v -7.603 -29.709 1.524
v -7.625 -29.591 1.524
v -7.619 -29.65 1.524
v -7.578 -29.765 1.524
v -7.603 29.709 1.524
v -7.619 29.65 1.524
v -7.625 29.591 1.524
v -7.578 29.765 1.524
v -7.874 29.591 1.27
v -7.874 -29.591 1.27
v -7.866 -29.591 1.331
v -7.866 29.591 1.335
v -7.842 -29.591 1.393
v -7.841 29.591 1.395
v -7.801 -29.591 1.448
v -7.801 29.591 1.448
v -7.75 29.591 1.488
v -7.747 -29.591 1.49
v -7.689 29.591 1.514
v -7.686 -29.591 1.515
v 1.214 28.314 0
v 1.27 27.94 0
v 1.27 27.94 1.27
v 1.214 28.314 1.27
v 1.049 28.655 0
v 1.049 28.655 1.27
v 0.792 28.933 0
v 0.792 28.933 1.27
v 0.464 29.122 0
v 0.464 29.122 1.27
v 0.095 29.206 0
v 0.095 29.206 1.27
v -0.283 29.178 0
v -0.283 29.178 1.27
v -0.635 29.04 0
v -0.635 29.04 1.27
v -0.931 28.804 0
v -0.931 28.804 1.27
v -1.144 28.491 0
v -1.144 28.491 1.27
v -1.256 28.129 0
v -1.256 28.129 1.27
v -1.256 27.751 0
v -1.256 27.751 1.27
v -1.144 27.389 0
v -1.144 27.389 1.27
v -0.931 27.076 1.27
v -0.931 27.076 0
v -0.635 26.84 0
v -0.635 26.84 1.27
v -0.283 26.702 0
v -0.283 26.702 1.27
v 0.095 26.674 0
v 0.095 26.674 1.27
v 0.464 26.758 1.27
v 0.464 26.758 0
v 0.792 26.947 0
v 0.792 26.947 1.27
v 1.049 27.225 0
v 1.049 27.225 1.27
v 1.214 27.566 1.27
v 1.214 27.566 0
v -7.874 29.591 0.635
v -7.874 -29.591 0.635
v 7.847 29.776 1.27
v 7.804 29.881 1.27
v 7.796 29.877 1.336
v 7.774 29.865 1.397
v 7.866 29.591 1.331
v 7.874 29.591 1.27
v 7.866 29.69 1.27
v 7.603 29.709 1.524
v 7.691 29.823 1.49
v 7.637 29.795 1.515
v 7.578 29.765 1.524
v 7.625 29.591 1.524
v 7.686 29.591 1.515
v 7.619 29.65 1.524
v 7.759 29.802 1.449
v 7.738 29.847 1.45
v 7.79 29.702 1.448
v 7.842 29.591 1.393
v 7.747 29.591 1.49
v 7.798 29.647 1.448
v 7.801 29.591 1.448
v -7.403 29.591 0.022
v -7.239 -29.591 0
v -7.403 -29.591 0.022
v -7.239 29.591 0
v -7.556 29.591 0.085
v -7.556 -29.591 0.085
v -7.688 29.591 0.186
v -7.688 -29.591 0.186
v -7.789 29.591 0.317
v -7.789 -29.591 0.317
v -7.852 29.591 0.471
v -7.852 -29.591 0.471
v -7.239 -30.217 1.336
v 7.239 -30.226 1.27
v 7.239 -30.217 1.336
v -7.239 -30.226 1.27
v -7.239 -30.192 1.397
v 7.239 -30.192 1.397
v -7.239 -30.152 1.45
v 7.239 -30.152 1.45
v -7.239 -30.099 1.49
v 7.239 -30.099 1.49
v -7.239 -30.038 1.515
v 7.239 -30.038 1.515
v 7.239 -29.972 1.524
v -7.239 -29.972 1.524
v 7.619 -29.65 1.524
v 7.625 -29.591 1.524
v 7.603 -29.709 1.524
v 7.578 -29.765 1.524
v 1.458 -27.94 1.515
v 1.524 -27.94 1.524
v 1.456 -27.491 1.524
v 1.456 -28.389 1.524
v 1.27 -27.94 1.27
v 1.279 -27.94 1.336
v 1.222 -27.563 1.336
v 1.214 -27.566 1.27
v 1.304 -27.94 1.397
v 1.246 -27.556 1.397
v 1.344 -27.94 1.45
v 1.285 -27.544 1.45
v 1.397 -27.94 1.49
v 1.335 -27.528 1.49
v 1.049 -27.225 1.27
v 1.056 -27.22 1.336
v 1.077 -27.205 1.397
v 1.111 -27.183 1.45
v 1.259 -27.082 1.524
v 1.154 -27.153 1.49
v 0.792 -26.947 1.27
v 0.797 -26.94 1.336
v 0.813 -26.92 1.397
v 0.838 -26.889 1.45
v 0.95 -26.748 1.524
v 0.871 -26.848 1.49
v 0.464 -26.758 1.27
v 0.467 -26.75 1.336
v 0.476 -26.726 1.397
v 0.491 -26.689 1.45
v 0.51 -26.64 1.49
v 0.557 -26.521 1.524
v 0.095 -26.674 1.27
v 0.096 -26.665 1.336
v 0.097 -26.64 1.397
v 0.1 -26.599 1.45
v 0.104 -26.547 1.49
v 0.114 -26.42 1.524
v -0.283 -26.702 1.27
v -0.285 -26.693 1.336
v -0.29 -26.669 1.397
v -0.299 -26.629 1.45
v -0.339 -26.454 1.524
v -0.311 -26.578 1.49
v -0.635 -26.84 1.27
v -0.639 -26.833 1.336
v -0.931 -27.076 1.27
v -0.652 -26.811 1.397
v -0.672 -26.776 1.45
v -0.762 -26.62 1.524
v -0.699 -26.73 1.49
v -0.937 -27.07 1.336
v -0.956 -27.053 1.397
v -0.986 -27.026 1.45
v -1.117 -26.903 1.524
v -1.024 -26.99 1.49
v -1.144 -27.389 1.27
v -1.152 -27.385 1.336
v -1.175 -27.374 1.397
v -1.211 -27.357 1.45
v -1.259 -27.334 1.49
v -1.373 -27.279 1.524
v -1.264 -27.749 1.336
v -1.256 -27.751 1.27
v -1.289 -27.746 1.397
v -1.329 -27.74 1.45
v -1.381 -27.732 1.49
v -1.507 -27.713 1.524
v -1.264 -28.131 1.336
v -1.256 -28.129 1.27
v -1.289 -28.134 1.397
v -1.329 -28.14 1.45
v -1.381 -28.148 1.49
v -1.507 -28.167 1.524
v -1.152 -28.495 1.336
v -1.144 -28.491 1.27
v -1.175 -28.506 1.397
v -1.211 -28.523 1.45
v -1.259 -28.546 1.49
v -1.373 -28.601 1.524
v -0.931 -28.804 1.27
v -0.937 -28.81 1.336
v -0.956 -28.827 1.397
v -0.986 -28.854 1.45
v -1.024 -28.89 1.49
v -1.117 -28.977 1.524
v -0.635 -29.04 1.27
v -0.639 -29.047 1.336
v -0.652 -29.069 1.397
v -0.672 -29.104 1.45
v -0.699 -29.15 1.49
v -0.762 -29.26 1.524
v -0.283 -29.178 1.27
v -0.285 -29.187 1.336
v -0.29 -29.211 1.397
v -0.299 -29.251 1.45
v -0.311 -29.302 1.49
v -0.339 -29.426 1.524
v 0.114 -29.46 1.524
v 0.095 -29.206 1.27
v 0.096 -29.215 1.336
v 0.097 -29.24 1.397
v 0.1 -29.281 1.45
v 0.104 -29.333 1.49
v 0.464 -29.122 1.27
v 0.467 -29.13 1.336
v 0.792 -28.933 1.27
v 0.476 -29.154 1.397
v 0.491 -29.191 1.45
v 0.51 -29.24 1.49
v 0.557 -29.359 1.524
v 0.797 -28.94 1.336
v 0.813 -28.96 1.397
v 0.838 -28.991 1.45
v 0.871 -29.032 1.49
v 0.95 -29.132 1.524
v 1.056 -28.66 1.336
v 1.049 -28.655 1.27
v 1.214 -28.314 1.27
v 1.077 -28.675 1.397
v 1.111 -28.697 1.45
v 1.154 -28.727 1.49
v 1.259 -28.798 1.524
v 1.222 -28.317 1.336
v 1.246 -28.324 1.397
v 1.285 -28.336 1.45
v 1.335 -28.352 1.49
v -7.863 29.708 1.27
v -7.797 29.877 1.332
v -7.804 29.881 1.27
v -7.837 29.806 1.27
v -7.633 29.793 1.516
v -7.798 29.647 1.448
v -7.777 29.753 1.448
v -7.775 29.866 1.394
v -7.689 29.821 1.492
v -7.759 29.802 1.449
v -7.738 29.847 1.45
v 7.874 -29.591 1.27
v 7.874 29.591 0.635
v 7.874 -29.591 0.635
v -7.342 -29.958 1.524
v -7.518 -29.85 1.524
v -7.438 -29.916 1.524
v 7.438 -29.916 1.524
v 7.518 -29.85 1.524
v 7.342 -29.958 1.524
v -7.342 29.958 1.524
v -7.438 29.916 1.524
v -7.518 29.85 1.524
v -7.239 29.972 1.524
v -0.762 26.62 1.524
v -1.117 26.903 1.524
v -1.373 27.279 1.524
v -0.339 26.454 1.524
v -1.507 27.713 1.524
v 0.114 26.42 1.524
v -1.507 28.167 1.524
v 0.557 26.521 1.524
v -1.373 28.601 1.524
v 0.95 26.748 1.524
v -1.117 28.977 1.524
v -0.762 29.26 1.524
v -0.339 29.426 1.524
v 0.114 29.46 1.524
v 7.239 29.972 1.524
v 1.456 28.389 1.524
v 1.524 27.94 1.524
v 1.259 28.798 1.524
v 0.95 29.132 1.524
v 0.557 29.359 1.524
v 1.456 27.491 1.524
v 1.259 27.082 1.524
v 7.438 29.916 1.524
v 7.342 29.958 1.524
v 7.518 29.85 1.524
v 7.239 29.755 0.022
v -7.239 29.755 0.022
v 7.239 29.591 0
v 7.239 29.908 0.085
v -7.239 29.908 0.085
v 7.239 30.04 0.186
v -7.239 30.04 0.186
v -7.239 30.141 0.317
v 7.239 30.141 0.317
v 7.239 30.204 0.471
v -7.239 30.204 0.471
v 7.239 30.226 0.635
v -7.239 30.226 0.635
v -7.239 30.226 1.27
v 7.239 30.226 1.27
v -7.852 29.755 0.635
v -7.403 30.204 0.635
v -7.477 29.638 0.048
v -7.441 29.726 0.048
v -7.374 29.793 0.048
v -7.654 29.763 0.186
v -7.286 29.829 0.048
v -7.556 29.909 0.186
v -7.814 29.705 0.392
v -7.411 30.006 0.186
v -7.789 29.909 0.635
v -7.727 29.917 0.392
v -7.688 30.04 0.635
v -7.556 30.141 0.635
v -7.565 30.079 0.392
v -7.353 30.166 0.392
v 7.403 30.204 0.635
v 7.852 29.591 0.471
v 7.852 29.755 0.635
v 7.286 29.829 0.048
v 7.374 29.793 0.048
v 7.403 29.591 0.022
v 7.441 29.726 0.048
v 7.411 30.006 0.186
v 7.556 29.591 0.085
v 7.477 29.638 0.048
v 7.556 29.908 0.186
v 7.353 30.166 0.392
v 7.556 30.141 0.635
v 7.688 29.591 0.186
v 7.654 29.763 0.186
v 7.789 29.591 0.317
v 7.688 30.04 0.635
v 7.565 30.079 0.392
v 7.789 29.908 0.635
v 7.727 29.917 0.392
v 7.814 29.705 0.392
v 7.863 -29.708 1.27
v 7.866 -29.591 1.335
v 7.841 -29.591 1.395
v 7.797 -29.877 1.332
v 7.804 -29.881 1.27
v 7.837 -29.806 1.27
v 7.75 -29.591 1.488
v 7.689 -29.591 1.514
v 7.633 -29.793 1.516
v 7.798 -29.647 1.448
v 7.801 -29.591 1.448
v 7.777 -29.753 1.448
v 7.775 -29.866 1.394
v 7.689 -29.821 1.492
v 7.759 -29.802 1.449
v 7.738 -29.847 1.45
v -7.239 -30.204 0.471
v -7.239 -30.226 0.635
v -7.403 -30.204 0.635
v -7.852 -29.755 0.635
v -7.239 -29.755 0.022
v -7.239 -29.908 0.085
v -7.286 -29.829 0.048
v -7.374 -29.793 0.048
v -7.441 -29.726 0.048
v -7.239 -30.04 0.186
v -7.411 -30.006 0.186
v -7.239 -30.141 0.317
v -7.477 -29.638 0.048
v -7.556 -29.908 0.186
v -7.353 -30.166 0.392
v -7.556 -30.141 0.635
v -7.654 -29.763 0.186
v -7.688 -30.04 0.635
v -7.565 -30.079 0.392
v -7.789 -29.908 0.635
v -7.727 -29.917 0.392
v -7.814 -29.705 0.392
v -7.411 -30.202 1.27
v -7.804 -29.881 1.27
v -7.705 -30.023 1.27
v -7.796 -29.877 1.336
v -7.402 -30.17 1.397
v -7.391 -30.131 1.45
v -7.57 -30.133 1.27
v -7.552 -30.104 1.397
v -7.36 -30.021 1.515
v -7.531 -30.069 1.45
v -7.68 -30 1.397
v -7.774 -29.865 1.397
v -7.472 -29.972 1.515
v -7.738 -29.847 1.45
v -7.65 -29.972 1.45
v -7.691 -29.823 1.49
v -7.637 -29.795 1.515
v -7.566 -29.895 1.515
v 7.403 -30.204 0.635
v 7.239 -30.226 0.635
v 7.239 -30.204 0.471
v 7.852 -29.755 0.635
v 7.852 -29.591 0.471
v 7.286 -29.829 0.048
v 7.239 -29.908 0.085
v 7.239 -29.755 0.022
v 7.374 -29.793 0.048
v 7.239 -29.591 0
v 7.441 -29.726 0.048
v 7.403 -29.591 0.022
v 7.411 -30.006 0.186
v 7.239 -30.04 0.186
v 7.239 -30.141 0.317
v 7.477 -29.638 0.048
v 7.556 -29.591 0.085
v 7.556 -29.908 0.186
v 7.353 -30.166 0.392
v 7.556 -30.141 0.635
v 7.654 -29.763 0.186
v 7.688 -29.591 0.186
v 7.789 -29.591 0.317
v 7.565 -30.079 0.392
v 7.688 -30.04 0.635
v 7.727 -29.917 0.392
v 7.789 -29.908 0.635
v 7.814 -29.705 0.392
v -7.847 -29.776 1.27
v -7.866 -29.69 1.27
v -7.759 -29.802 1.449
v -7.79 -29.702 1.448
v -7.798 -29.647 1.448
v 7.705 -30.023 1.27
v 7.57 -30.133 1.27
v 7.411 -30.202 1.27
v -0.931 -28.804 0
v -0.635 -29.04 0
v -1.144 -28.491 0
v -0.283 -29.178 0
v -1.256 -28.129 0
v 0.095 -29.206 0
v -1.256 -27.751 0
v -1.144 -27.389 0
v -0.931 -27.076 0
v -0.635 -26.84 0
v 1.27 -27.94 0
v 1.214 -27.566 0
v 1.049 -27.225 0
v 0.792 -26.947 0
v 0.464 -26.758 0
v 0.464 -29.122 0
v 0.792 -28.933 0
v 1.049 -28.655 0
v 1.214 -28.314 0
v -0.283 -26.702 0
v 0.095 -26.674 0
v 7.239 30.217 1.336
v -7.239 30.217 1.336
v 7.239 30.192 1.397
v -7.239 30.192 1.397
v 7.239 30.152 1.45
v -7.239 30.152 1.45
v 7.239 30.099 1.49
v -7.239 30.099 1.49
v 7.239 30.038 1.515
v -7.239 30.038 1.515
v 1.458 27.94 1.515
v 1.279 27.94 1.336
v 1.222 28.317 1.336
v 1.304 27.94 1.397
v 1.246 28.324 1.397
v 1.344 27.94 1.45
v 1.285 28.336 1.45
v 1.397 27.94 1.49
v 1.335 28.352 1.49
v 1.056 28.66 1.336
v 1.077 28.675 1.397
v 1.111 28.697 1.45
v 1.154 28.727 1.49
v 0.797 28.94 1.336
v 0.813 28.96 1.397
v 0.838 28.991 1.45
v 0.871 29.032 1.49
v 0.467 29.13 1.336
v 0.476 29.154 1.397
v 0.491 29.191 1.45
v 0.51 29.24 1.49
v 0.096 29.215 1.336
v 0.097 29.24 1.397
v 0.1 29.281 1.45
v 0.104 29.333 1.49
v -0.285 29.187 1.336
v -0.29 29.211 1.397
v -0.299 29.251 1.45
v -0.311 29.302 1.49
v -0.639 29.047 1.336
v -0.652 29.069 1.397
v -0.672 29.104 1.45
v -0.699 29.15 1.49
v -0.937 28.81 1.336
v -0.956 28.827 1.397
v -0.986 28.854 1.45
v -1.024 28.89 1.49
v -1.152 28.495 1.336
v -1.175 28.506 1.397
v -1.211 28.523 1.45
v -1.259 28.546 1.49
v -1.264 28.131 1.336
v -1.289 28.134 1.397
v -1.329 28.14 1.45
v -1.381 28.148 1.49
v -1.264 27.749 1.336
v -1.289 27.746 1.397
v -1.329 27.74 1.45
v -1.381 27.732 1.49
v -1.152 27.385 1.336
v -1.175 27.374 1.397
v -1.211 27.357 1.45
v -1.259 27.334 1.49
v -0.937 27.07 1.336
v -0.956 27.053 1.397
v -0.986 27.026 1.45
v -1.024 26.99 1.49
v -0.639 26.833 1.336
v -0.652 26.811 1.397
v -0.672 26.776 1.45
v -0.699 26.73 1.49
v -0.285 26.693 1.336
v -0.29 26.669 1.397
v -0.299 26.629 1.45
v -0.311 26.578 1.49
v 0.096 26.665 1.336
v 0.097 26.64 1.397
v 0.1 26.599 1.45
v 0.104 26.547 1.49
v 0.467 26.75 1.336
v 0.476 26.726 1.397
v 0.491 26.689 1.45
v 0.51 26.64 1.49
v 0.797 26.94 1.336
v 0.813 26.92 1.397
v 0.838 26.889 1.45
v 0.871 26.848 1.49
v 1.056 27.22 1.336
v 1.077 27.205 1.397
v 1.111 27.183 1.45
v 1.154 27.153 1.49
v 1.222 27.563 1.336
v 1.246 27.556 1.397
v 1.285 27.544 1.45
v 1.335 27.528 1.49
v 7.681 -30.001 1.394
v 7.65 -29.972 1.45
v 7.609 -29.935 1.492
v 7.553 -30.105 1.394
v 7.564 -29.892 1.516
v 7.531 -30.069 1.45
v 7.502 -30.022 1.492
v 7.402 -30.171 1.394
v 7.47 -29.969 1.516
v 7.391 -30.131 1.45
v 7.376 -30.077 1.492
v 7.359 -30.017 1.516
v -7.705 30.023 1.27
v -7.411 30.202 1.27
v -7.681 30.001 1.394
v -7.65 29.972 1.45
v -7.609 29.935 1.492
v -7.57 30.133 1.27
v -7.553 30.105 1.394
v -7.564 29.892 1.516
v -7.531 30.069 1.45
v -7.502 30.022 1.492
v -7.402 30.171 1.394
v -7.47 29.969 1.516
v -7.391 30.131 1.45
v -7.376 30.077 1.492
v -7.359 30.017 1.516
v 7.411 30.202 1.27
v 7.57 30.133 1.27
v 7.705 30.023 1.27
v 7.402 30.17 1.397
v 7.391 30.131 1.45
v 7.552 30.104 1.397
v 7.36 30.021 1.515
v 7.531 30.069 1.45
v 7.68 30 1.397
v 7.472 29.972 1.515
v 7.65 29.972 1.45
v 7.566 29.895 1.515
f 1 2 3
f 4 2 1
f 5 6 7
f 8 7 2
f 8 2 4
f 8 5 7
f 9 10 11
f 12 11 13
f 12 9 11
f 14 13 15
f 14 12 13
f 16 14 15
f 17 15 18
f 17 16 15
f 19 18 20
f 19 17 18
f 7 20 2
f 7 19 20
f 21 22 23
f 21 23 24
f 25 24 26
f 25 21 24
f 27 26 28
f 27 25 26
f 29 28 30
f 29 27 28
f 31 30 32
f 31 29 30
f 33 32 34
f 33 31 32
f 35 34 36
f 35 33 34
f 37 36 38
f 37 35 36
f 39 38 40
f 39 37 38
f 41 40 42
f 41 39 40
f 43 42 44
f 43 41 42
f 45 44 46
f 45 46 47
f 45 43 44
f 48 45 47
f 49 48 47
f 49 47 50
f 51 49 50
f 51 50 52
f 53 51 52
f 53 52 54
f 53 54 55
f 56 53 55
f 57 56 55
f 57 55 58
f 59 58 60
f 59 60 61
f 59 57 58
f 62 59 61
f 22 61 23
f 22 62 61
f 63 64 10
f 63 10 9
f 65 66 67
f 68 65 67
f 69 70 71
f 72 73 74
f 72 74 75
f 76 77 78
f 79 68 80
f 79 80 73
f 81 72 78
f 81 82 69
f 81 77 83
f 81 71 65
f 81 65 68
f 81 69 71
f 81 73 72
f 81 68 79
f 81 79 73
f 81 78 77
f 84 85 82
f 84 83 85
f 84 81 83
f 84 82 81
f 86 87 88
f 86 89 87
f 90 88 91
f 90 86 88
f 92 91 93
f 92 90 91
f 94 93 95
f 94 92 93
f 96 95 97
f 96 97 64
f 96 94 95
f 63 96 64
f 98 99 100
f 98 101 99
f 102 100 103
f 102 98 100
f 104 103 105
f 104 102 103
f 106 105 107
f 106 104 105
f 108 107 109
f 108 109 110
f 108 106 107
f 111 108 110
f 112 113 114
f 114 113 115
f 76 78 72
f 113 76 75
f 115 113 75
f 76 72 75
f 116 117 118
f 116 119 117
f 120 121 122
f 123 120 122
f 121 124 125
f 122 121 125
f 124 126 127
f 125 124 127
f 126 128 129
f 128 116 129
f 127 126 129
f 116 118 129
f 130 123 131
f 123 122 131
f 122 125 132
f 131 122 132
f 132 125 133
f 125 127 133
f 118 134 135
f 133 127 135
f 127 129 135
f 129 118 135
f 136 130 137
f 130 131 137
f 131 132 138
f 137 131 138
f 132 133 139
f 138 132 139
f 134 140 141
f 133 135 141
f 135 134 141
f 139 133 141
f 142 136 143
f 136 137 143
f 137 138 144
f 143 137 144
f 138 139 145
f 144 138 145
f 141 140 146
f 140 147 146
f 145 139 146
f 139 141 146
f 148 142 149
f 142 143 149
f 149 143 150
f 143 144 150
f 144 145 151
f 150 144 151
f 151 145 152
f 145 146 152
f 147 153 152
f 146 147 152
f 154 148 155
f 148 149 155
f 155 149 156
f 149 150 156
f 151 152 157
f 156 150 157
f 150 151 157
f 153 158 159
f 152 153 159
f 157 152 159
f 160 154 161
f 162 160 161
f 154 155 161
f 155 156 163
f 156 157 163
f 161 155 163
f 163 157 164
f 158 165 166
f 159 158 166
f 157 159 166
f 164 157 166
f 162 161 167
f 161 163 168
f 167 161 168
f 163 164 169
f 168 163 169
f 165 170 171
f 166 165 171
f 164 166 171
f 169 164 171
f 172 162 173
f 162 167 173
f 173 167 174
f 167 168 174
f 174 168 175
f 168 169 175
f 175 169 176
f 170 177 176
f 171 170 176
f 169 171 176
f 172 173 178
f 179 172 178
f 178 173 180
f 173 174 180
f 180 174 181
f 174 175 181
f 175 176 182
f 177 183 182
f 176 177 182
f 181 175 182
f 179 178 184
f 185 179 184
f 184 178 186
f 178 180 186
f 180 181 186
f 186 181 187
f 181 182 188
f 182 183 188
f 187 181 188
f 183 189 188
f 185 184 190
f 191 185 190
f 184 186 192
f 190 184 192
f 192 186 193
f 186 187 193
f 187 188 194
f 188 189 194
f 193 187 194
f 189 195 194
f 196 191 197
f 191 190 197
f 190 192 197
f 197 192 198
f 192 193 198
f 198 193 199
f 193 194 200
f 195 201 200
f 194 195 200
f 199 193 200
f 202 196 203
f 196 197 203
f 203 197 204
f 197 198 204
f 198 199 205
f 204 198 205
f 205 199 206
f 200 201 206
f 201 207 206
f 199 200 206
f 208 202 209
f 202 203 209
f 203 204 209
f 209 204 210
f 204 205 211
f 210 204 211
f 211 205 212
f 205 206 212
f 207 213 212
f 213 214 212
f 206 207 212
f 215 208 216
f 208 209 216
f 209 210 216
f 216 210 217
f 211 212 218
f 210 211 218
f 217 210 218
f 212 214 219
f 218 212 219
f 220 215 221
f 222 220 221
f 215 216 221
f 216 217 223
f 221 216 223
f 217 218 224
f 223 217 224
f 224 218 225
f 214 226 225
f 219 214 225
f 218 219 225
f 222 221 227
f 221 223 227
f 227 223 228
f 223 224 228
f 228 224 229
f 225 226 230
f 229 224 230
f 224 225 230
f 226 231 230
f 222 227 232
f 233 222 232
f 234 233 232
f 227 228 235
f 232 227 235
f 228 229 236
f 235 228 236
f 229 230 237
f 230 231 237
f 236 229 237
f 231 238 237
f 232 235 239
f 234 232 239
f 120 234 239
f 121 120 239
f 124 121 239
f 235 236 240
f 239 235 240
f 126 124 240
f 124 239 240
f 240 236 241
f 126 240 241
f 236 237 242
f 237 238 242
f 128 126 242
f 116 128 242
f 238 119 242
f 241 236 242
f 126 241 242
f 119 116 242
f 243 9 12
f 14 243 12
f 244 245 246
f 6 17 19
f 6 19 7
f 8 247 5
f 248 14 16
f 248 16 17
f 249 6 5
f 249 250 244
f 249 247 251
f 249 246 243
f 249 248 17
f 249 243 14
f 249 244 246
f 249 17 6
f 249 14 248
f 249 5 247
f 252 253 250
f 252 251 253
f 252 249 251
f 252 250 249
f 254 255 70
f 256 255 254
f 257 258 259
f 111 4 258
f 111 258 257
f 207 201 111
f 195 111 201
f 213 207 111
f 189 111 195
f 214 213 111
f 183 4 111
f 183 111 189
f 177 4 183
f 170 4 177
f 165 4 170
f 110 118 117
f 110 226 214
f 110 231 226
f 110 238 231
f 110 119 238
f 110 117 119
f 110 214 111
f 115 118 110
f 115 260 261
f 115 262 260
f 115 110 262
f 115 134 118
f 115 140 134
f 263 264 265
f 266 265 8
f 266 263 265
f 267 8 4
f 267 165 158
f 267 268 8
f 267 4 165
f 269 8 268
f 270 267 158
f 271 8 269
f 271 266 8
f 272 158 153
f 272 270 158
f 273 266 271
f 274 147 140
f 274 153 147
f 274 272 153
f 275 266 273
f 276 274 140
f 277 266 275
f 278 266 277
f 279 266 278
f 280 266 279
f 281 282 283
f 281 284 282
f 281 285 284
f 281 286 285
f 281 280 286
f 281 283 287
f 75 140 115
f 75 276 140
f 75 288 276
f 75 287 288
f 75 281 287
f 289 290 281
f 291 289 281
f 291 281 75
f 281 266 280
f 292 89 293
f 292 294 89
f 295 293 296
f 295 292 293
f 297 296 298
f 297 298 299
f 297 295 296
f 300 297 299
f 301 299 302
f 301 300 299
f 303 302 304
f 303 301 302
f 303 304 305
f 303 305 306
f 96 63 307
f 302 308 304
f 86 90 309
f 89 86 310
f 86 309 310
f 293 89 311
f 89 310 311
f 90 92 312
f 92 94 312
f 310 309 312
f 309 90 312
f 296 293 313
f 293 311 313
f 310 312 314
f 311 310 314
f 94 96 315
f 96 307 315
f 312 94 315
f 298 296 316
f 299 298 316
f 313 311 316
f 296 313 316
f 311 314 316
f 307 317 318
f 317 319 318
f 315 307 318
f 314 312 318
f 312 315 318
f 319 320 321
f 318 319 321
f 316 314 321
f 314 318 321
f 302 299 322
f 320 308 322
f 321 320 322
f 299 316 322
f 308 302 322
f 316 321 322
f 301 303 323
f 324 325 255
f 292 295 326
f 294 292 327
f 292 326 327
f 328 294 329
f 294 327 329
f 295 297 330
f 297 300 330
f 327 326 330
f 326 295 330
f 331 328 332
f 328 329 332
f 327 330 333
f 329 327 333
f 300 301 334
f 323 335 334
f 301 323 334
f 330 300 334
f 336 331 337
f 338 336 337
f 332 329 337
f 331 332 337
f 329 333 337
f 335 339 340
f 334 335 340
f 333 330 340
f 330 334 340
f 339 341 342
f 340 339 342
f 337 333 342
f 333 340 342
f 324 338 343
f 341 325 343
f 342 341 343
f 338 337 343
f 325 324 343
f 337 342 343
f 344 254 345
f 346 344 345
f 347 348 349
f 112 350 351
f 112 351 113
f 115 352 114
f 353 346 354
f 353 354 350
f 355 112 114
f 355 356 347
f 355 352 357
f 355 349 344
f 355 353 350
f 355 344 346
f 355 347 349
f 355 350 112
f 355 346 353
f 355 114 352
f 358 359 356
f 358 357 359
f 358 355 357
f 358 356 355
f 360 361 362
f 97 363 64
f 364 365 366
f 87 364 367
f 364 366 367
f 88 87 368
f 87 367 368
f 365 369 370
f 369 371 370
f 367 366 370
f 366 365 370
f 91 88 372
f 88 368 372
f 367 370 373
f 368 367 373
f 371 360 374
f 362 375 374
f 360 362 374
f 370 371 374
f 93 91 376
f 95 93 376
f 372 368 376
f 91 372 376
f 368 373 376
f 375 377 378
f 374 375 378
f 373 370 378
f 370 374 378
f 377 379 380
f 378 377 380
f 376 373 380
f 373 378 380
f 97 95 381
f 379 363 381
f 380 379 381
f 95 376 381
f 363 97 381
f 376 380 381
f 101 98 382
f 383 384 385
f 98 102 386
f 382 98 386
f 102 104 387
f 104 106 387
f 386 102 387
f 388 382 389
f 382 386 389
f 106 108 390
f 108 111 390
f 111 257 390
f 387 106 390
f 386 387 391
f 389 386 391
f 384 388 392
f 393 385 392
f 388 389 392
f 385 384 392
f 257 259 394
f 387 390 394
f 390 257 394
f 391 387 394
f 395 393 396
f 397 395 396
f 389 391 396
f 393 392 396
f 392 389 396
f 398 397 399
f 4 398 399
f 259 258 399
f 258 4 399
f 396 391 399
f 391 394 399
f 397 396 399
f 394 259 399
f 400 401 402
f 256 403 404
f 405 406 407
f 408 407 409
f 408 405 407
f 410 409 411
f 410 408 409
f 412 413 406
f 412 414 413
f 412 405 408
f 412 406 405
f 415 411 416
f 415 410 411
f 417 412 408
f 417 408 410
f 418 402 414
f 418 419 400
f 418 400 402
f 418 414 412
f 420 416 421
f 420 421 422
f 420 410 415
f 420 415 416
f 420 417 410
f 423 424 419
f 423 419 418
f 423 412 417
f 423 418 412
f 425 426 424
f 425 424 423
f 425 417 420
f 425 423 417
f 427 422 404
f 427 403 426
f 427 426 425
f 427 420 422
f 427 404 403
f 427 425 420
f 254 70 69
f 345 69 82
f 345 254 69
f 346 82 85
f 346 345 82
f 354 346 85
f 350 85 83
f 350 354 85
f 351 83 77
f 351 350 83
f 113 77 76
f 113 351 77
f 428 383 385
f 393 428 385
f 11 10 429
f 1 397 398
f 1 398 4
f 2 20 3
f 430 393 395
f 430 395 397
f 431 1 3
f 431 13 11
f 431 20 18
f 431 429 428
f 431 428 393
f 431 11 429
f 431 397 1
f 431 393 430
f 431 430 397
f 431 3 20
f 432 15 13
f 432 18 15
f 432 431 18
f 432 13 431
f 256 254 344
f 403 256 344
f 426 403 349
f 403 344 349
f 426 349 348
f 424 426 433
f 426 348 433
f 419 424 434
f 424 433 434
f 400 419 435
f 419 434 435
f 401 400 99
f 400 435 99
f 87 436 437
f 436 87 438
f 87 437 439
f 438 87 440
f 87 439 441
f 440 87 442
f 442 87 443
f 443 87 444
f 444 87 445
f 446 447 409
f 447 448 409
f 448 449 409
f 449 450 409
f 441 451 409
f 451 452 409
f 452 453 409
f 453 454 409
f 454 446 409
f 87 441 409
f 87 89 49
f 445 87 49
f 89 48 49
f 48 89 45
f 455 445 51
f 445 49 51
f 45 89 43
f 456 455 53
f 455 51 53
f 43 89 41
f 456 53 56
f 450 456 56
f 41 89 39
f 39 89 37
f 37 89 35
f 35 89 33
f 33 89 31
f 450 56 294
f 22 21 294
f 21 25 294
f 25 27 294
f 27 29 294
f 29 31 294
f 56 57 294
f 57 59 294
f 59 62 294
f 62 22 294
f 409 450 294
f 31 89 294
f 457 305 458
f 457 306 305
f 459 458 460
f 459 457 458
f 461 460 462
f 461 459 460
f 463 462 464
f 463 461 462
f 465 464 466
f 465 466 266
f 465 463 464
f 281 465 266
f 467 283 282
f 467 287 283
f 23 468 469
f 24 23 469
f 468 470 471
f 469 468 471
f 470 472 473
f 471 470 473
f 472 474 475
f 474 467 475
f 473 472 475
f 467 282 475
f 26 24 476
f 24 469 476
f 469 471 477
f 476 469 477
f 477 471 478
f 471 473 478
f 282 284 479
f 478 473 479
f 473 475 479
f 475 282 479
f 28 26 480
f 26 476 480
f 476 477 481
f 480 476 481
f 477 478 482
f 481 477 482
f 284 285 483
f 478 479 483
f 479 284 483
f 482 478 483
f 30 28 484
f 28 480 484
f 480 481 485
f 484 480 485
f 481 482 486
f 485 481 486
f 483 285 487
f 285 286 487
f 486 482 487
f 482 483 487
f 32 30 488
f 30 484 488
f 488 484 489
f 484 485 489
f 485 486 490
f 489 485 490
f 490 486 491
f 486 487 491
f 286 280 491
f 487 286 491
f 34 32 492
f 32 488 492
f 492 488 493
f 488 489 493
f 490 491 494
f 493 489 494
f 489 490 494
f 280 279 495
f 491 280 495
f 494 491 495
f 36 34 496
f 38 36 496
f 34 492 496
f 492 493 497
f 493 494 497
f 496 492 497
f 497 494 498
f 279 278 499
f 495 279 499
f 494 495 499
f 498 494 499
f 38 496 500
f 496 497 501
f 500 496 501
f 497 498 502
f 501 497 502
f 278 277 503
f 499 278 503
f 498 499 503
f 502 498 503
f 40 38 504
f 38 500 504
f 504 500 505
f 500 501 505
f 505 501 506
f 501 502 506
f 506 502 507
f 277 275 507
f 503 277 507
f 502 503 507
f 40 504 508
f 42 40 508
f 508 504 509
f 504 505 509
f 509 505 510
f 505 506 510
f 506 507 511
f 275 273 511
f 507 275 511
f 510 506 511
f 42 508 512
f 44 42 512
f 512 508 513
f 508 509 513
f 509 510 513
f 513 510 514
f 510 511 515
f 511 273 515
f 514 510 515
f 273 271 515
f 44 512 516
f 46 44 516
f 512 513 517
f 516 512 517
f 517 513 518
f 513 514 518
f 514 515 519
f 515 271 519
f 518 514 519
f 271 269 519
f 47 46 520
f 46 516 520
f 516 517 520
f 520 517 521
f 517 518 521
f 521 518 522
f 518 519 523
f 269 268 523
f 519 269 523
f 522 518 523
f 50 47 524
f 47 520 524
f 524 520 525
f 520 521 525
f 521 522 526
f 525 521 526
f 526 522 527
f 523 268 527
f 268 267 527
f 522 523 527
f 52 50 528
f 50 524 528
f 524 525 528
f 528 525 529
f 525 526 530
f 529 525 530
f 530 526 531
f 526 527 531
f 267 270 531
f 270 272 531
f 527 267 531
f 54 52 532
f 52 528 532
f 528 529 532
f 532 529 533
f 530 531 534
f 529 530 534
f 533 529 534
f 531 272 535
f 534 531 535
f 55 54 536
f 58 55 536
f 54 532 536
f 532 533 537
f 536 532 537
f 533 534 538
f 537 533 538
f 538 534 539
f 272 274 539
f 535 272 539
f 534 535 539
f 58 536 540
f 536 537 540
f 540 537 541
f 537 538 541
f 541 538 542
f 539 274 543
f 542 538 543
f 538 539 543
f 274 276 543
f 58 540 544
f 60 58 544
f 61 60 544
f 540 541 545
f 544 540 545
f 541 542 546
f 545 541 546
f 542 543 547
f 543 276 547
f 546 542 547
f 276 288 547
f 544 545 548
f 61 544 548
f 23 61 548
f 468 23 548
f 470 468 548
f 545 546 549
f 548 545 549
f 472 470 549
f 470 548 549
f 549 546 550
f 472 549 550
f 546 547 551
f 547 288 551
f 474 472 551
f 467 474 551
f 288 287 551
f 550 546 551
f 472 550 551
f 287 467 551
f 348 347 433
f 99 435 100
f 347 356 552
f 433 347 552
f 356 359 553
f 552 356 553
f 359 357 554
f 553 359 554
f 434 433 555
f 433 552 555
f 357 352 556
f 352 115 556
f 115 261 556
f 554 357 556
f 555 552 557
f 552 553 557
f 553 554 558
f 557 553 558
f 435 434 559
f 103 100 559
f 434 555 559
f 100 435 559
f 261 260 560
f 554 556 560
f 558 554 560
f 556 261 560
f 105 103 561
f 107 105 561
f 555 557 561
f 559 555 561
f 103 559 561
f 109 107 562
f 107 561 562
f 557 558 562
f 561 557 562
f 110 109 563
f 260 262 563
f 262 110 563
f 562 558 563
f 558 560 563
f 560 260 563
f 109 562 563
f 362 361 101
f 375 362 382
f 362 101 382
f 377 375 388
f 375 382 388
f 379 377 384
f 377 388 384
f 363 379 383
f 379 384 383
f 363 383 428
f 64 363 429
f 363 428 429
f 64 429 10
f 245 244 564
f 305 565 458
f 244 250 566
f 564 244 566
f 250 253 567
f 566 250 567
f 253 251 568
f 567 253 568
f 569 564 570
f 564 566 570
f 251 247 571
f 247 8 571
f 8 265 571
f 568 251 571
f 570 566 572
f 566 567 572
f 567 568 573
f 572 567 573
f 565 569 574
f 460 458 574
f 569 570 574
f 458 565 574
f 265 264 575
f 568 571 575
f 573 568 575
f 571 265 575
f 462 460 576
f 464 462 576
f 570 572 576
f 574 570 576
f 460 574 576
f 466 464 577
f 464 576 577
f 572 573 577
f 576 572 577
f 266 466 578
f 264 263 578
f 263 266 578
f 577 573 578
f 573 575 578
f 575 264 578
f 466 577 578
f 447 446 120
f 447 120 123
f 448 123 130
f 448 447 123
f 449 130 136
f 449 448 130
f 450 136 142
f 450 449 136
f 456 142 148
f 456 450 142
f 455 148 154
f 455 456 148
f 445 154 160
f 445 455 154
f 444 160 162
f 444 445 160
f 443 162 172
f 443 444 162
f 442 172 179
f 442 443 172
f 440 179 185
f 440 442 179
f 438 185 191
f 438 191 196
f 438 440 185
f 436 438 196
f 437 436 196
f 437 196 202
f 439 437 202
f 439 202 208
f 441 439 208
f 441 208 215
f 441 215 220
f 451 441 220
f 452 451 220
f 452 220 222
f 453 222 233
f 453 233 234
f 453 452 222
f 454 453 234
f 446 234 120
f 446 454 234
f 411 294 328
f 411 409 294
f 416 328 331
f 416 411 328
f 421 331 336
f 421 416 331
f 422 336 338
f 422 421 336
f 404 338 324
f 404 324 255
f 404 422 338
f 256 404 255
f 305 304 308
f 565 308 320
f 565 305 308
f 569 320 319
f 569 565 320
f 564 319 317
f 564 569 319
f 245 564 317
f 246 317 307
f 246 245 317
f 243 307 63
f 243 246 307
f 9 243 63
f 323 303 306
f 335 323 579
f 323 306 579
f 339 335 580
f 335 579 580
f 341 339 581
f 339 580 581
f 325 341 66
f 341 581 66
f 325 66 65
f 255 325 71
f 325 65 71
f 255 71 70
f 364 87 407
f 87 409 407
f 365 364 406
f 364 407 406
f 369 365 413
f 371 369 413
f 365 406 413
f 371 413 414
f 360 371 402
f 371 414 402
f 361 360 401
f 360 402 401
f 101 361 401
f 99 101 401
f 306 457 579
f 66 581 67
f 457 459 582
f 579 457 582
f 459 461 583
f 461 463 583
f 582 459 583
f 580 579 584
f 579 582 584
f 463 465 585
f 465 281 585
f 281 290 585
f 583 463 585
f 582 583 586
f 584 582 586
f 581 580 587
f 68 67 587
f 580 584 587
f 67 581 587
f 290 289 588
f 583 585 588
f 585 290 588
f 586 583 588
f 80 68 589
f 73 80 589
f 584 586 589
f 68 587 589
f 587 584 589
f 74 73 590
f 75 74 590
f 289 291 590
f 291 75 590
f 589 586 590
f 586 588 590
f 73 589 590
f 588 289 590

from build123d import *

# Parameters (mm, degrees)
F0_W        = 16.002
F0_H        = 60.96
F0_R        = 1.27
F0_W_2      = 1.905
F1_DEPTH    = 1.524
F2_T1_DEPTH = 72.5997422652
F3_W        = 15.748
F3_H        = 0.254
F4_DEPTH    = 25.4
F5_R        = 0.635
F6_R        = 0.254


# Not quite as in the source:
# - a fillet or chamfer that OpenCascade refuses, or shapes differently, is made with other operations: its cross-section is extruded or revolved along the edge and cut away or added


with BuildPart() as f1:
    # F0 (on Top) → F1 (new body)
    with BuildSketch(Plane.XY):
        Rectangle(F0_W, F0_H)
        with Locations((0, -27.94)):
            Circle(F0_R, mode=Mode.SUBTRACT)
        with Locations((0, 27.94)):
            Circle(F0_R, mode=Mode.SUBTRACT)
        with Locations((-8.9535, 0)):
            Rectangle(F0_W_2, F0_H)
        with Locations((8.9535, 0)):
            Rectangle(F0_W_2, F0_H)
    extrude(amount=F1_DEPTH)

    # F2: fillet of radius 2.54 on 2 edges, made by hand

    # F2_s2 → F2_t1 (cut)
    with BuildSketch(Plane.XZ.offset(-36.2998711326)):
        with BuildLine():
            ThreePointArc((-9.906, 0), (-8.969266843, 1.1091164674), (-7.578051547, 1.524))
            Line((-7.578051547, 1.524), (-9.906, 1.524))
            Line((-9.906, 1.524), (-9.906, 0))
        make_face()
        with BuildLine():
            ThreePointArc((9.906, 0), (8.969266843, 1.1091164674), (7.578051547, 1.524))
            Line((7.578051547, 1.524), (9.906, 1.524))
            Line((9.906, 1.524), (9.906, 0))
        make_face()
    extrude(amount=F2_T1_DEPTH, mode=Mode.SUBTRACT)

    # F3 (on Top) → F4 (cut)
    with BuildSketch(Plane.XY):
        with Locations((0, 30.353)):
            Rectangle(F3_W, F3_H)
        Polygon((11.6183462764, 30.48), (7.874, 30.48), (7.874, 30.226), (7.874, -30.226), (7.874, -30.48), (11.6183462764, -30.48), align=None)
        Polygon((-7.874, 30.226), (-7.874, 30.48), (-11.6183462764, 30.48), (-11.6183462764, -30.48), (-7.874, -30.48), (-7.874, -30.226), align=None)
        with Locations((0, -30.353)):
            Rectangle(F3_W, F3_H)
    extrude(amount=F4_DEPTH, mode=Mode.SUBTRACT)

    # F5
    f5_edges = [f1.edges().sort_by_distance(p)[0] for p in [
        (-7.874, 30.226, 0.75335),
        (7.874, 30.226, 0.75335),
        (-7.874, -30.226, 0.75335),
        (7.874, -30.226, 0.75335),
        (0, -30.226, 0),
        (-7.874, 0, 0),
        (0, 30.226, 0),
        (7.874, 0, 0),
    ]]
    fillet(f5_edges, radius=F5_R)

    # F6
    f6_edges = [f1.edges().sort_by_distance(p)[0] for p in [
        (0, -30.226, 1.524),
        (-1.27, -27.94, 1.524),
        (-1.27, 27.94, 1.524),
        (7.874, 0, 1.5067),
        (-7.874, 0, 1.5067),
        (0, 30.226, 1.524),
        (7.415478, 30.200984, 1.524),
        (7.415478, -30.200984, 1.524),
        (-7.415478, 30.200984, 1.524),
        (-7.415478, -30.200984, 1.524),
        (7.798093, -29.892064, 1.514451),
        (-7.798115, -29.892025, 1.514449),
        (7.798115, 29.892025, 1.514449),
        (-7.798115, 29.892025, 1.514449),
    ]]
    fillet(f6_edges, radius=F6_R)


solid = f1.part
